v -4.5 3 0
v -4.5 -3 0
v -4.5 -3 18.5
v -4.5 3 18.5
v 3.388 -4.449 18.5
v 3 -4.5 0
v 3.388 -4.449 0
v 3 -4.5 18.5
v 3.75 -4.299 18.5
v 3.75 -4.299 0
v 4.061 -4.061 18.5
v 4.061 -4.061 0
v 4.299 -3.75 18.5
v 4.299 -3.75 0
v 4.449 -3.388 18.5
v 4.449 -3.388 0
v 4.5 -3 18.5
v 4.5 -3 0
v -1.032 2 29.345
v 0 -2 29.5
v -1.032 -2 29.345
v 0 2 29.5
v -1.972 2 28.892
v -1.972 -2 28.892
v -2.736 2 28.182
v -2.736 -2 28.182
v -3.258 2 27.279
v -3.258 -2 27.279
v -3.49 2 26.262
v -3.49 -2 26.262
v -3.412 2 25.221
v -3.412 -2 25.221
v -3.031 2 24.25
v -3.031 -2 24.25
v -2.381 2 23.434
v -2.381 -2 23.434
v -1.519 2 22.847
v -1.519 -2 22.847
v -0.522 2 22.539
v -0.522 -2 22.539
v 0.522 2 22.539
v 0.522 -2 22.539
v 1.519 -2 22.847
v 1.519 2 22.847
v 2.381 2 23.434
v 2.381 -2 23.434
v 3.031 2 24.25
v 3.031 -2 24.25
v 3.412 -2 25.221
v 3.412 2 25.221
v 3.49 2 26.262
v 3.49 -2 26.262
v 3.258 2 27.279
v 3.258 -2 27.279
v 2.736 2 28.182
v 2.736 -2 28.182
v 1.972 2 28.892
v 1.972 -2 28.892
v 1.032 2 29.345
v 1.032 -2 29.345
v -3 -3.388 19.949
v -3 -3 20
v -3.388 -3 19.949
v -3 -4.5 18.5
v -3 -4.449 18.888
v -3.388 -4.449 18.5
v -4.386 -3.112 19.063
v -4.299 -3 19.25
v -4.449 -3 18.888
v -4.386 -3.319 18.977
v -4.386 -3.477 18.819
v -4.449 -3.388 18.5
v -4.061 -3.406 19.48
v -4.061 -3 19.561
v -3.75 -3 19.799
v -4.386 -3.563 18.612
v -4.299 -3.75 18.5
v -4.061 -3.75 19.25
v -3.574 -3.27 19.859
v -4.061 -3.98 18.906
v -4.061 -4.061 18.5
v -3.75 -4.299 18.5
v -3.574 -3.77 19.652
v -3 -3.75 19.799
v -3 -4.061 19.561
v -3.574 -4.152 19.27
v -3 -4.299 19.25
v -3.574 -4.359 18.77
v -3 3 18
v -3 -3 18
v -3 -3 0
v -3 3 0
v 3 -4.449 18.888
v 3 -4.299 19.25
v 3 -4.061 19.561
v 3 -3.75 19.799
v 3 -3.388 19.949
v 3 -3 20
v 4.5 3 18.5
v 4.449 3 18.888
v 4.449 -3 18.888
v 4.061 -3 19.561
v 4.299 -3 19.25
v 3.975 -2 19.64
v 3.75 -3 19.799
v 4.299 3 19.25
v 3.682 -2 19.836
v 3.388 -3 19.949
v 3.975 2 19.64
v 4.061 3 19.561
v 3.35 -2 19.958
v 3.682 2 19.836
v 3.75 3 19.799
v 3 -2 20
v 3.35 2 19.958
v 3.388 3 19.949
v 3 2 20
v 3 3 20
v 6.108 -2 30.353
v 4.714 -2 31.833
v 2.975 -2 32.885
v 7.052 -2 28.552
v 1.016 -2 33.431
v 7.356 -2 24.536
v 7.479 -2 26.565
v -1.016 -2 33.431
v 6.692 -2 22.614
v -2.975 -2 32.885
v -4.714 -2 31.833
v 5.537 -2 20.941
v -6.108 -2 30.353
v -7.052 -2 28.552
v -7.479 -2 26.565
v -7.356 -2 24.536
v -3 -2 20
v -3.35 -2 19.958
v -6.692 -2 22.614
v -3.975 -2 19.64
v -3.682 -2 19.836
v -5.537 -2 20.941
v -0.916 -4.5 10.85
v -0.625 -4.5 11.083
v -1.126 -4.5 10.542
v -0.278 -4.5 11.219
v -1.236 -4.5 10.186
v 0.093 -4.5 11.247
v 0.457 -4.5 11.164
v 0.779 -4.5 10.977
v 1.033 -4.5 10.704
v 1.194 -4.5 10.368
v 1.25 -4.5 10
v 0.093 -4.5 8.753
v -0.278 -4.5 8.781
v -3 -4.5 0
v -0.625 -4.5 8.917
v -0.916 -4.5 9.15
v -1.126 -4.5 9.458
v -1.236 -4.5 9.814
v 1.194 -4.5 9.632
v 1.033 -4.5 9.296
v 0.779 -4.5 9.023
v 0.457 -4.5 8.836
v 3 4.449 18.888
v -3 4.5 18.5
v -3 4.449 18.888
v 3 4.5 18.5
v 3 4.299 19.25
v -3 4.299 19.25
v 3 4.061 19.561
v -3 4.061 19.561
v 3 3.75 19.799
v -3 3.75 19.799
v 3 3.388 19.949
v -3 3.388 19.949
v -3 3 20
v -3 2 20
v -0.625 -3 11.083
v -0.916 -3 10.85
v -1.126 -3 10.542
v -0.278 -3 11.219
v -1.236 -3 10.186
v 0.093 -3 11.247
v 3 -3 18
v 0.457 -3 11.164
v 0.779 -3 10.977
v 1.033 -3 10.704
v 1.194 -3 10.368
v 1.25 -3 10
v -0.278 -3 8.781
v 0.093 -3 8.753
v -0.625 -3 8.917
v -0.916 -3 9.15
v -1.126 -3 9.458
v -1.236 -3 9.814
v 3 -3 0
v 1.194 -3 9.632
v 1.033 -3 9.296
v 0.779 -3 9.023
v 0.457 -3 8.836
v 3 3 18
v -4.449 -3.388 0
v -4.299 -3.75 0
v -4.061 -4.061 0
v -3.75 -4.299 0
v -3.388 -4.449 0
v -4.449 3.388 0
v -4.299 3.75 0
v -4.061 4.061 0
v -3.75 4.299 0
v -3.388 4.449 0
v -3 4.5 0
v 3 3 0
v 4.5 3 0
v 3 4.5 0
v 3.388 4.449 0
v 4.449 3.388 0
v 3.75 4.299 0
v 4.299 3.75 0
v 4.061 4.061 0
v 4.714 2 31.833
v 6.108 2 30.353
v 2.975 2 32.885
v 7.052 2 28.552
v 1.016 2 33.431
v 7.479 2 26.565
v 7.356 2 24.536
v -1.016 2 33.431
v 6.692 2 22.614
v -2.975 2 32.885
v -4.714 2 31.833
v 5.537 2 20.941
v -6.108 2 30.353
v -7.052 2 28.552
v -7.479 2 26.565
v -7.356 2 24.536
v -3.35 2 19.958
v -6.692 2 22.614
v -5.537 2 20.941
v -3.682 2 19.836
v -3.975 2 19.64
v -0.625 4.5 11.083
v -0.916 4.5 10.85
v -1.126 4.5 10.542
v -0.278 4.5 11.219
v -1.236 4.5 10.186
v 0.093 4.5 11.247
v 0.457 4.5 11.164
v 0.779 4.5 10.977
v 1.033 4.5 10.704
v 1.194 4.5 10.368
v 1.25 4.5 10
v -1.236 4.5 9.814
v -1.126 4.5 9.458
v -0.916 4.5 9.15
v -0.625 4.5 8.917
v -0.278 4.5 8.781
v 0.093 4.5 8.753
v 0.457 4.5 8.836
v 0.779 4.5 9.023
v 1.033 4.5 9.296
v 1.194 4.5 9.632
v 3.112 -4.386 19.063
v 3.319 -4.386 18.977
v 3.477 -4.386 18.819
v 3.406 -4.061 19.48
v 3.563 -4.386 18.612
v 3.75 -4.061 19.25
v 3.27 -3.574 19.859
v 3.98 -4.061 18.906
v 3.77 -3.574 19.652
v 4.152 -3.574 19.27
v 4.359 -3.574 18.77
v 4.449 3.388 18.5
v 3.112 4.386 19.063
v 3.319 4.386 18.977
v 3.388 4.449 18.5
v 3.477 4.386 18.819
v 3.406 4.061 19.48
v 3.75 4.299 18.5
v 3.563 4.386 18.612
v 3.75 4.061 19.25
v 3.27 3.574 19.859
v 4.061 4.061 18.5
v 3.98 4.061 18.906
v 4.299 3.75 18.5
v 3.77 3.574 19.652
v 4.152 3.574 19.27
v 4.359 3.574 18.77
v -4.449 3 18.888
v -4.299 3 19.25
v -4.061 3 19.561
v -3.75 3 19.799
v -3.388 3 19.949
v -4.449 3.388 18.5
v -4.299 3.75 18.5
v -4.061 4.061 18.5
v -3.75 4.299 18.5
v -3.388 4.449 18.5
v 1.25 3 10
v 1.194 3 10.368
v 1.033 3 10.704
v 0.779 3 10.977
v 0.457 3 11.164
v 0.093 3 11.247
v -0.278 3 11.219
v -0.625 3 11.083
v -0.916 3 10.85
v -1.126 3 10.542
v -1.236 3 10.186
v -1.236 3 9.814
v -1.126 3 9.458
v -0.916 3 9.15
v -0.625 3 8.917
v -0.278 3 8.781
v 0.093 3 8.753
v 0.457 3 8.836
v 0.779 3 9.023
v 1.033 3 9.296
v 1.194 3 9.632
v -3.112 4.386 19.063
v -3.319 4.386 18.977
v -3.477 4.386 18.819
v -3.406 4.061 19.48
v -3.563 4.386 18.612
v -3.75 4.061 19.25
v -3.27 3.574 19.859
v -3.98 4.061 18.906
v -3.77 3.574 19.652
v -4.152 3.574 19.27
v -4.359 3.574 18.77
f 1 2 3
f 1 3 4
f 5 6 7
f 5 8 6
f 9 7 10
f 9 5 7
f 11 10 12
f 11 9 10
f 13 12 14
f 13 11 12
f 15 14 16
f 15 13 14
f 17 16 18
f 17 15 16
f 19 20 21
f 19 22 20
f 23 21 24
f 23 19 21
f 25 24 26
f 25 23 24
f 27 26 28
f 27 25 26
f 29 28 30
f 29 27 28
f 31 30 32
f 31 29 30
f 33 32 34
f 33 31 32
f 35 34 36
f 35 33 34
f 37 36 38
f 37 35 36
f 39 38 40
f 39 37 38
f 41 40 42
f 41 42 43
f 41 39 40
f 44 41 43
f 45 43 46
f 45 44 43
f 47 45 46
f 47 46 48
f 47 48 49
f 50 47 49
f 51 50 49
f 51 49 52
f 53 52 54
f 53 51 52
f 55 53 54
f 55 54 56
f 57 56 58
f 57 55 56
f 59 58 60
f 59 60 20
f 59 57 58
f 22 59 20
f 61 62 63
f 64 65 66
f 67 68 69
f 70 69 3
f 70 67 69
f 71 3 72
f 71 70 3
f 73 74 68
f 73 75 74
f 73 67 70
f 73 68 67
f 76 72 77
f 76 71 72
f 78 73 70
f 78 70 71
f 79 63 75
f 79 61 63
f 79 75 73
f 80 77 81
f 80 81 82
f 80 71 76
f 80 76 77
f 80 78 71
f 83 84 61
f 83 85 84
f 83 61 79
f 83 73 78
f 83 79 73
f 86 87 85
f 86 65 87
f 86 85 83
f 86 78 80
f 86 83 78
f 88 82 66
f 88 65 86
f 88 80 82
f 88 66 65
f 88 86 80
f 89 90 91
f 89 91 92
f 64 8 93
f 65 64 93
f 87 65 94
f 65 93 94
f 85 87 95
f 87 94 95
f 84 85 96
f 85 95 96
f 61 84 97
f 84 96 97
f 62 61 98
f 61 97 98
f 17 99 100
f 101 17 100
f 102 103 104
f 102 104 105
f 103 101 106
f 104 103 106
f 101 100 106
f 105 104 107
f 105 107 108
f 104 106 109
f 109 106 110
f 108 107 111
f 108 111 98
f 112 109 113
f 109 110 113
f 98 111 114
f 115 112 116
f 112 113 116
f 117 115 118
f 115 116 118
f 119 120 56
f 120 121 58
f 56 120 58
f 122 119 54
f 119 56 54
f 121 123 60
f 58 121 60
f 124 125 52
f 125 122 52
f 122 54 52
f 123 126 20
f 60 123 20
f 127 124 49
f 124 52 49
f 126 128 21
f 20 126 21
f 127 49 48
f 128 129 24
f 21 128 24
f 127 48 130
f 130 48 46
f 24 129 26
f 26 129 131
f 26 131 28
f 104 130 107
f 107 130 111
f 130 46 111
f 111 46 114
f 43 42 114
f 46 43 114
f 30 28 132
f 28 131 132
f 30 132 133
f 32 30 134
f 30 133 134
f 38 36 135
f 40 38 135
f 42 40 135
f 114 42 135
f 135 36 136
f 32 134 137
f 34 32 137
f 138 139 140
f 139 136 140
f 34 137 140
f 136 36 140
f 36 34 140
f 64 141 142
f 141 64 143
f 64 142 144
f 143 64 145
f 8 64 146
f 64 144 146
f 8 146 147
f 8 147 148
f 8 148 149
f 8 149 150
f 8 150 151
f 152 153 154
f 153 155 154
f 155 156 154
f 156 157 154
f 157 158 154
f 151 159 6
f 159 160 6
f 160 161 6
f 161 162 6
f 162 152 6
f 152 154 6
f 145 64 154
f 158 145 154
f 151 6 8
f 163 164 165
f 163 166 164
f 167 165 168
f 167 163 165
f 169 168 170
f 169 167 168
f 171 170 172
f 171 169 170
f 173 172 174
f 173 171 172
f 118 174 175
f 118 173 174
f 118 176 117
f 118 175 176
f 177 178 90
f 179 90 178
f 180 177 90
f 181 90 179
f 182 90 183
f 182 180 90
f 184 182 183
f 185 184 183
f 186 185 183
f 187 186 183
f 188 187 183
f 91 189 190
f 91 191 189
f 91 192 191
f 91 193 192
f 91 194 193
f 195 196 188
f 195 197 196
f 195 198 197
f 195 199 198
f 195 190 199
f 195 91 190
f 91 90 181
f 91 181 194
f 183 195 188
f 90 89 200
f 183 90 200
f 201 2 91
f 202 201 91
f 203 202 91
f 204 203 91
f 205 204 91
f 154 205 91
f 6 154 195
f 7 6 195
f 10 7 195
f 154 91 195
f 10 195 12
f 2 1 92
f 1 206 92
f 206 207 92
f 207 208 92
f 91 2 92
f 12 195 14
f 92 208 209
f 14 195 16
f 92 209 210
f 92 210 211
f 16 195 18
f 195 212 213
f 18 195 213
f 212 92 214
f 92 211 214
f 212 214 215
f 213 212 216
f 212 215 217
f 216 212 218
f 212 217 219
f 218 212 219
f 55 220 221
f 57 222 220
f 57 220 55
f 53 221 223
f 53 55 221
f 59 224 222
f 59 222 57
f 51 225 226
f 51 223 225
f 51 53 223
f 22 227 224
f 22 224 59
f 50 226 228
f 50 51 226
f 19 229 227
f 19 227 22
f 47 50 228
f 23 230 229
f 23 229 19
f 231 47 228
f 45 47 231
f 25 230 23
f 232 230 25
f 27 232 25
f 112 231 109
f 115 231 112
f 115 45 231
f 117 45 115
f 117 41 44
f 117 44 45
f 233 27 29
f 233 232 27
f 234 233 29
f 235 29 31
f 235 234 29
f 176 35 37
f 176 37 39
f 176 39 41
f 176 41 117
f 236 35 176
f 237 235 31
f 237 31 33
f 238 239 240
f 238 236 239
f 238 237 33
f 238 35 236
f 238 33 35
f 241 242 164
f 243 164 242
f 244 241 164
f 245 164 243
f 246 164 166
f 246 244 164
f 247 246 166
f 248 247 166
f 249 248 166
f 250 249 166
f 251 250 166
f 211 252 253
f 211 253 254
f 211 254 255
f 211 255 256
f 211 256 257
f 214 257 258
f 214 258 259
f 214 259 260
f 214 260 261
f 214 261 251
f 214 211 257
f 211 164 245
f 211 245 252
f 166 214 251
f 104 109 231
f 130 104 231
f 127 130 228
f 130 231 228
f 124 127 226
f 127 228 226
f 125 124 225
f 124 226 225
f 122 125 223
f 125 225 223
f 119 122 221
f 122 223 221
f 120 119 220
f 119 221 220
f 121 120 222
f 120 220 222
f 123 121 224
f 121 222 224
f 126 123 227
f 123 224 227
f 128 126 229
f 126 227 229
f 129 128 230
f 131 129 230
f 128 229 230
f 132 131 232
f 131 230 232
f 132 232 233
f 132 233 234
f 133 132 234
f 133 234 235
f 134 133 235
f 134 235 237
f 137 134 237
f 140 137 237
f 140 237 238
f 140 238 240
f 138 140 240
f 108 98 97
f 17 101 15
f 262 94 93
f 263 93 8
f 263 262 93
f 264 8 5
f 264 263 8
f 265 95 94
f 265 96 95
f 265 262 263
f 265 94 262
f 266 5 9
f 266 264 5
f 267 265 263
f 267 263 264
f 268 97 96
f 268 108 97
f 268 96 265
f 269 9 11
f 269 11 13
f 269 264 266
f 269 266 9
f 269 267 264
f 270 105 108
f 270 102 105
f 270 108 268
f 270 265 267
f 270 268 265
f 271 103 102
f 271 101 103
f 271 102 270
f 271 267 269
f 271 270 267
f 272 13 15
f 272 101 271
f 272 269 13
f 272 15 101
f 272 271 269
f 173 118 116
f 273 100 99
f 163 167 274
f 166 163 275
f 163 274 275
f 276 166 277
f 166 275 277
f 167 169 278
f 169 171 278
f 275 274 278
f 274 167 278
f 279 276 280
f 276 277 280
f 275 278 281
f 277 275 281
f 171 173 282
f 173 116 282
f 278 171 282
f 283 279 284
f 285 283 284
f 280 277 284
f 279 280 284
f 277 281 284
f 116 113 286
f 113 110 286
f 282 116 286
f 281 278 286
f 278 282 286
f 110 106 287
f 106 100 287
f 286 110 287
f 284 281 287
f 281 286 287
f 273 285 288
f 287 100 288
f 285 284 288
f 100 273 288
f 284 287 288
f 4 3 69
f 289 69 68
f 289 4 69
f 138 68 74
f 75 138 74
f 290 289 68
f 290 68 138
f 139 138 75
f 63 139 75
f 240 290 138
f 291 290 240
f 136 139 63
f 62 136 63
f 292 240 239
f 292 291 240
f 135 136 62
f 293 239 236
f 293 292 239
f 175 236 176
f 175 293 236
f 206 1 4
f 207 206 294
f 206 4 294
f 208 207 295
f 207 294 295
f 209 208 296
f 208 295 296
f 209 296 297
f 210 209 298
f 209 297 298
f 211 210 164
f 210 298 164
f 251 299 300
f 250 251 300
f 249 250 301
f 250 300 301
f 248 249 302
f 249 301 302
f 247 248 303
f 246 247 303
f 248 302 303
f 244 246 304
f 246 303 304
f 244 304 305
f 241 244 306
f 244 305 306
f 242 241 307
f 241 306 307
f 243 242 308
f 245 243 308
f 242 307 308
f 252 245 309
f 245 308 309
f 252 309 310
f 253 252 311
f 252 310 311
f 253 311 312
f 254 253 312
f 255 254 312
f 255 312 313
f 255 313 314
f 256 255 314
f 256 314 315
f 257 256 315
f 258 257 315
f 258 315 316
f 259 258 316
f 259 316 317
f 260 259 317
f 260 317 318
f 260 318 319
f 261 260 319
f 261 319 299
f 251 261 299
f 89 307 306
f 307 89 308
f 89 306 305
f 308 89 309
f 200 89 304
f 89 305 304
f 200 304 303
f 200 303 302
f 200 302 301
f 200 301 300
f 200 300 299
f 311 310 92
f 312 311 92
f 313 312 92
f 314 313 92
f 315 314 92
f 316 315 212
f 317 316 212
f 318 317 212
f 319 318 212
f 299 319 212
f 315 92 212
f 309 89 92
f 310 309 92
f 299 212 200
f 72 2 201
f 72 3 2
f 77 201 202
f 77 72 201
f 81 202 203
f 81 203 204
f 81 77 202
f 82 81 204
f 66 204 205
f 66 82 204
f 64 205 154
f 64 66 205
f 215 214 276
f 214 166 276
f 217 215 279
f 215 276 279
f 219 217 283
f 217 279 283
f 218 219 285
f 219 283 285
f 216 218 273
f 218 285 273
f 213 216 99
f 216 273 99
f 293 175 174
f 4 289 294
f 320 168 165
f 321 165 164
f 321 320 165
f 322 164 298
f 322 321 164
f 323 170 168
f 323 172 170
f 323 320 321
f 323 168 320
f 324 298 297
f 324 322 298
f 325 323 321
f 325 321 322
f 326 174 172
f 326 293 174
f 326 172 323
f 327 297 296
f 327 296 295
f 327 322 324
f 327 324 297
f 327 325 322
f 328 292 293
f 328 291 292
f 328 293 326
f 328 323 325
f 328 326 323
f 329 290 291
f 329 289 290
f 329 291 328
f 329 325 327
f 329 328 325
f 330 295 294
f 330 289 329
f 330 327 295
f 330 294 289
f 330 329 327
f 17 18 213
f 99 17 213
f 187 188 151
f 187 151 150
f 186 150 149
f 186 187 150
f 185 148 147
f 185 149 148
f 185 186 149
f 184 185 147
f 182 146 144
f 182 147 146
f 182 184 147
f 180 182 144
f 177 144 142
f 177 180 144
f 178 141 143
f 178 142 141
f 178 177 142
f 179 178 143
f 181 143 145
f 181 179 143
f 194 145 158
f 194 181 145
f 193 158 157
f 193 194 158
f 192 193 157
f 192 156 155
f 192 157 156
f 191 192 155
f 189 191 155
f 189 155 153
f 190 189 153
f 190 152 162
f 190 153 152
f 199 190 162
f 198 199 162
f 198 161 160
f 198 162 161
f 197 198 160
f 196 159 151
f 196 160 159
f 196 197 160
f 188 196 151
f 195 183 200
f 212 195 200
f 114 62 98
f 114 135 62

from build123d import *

# Parameters (mm, degrees)
F0_W          = 9
F0_H          = 9
F0_W_2        = 6
F0_H_2        = 6
F1_DEPTH      = 20
F2_START      = 18
F2_DEPTH      = 2
F3_R          = 1.5
F5_W          = 4
F5_H          = 4
F7_R          = 1.25
F8_DEPTH      = 25
F8_DEPTH_BACK = 25


with BuildPart() as f1:
    # F0 (on Top) → F1 (new body)
    with BuildSketch(Plane.XY):
        Rectangle(F0_W, F0_H)
        Rectangle(F0_W_2, F0_H_2, mode=Mode.SUBTRACT)
    extrude(amount=F1_DEPTH)

    # F0 (on Top) → F2 (join)
    with BuildSketch(Plane.XY.offset(F2_START)):
        Rectangle(F0_W_2, F0_H_2)
    extrude(amount=F2_DEPTH)

    # F3
    f3_edges = [f1.edges().sort_by_distance(p)[0] for p in [
        (4.5, 0, 20),
        (0, -4.5, 20),
        (-4.5, 0, 20),
        (0, 4.5, 20),
        (4.5, -4.5, 10),
        (4.5, 4.5, 10),
        (-4.5, -4.5, 10),
        (-4.5, 4.5, 10),
    ]]
    fillet(f3_edges, radius=F3_R)

    # F5 (on Right) → F6 (revolve)
    with BuildSketch(Plane.YZ):
        with Locations((0, 31.5)):
            Rectangle(F5_W, F5_H)
    revolve(axis=Axis((0, 0, 26), (0, -1, 0)))

    # F7 (on Front) → F8 (cut, two sides)
    with BuildSketch(Plane.XZ) as f8_sk:
        with Locations((0, 10)):
            Circle(F7_R)
    extrude(amount=F8_DEPTH, mode=Mode.SUBTRACT)
    extrude(f8_sk.sketch, amount=-F8_DEPTH_BACK, mode=Mode.SUBTRACT)


solid = f1.part
